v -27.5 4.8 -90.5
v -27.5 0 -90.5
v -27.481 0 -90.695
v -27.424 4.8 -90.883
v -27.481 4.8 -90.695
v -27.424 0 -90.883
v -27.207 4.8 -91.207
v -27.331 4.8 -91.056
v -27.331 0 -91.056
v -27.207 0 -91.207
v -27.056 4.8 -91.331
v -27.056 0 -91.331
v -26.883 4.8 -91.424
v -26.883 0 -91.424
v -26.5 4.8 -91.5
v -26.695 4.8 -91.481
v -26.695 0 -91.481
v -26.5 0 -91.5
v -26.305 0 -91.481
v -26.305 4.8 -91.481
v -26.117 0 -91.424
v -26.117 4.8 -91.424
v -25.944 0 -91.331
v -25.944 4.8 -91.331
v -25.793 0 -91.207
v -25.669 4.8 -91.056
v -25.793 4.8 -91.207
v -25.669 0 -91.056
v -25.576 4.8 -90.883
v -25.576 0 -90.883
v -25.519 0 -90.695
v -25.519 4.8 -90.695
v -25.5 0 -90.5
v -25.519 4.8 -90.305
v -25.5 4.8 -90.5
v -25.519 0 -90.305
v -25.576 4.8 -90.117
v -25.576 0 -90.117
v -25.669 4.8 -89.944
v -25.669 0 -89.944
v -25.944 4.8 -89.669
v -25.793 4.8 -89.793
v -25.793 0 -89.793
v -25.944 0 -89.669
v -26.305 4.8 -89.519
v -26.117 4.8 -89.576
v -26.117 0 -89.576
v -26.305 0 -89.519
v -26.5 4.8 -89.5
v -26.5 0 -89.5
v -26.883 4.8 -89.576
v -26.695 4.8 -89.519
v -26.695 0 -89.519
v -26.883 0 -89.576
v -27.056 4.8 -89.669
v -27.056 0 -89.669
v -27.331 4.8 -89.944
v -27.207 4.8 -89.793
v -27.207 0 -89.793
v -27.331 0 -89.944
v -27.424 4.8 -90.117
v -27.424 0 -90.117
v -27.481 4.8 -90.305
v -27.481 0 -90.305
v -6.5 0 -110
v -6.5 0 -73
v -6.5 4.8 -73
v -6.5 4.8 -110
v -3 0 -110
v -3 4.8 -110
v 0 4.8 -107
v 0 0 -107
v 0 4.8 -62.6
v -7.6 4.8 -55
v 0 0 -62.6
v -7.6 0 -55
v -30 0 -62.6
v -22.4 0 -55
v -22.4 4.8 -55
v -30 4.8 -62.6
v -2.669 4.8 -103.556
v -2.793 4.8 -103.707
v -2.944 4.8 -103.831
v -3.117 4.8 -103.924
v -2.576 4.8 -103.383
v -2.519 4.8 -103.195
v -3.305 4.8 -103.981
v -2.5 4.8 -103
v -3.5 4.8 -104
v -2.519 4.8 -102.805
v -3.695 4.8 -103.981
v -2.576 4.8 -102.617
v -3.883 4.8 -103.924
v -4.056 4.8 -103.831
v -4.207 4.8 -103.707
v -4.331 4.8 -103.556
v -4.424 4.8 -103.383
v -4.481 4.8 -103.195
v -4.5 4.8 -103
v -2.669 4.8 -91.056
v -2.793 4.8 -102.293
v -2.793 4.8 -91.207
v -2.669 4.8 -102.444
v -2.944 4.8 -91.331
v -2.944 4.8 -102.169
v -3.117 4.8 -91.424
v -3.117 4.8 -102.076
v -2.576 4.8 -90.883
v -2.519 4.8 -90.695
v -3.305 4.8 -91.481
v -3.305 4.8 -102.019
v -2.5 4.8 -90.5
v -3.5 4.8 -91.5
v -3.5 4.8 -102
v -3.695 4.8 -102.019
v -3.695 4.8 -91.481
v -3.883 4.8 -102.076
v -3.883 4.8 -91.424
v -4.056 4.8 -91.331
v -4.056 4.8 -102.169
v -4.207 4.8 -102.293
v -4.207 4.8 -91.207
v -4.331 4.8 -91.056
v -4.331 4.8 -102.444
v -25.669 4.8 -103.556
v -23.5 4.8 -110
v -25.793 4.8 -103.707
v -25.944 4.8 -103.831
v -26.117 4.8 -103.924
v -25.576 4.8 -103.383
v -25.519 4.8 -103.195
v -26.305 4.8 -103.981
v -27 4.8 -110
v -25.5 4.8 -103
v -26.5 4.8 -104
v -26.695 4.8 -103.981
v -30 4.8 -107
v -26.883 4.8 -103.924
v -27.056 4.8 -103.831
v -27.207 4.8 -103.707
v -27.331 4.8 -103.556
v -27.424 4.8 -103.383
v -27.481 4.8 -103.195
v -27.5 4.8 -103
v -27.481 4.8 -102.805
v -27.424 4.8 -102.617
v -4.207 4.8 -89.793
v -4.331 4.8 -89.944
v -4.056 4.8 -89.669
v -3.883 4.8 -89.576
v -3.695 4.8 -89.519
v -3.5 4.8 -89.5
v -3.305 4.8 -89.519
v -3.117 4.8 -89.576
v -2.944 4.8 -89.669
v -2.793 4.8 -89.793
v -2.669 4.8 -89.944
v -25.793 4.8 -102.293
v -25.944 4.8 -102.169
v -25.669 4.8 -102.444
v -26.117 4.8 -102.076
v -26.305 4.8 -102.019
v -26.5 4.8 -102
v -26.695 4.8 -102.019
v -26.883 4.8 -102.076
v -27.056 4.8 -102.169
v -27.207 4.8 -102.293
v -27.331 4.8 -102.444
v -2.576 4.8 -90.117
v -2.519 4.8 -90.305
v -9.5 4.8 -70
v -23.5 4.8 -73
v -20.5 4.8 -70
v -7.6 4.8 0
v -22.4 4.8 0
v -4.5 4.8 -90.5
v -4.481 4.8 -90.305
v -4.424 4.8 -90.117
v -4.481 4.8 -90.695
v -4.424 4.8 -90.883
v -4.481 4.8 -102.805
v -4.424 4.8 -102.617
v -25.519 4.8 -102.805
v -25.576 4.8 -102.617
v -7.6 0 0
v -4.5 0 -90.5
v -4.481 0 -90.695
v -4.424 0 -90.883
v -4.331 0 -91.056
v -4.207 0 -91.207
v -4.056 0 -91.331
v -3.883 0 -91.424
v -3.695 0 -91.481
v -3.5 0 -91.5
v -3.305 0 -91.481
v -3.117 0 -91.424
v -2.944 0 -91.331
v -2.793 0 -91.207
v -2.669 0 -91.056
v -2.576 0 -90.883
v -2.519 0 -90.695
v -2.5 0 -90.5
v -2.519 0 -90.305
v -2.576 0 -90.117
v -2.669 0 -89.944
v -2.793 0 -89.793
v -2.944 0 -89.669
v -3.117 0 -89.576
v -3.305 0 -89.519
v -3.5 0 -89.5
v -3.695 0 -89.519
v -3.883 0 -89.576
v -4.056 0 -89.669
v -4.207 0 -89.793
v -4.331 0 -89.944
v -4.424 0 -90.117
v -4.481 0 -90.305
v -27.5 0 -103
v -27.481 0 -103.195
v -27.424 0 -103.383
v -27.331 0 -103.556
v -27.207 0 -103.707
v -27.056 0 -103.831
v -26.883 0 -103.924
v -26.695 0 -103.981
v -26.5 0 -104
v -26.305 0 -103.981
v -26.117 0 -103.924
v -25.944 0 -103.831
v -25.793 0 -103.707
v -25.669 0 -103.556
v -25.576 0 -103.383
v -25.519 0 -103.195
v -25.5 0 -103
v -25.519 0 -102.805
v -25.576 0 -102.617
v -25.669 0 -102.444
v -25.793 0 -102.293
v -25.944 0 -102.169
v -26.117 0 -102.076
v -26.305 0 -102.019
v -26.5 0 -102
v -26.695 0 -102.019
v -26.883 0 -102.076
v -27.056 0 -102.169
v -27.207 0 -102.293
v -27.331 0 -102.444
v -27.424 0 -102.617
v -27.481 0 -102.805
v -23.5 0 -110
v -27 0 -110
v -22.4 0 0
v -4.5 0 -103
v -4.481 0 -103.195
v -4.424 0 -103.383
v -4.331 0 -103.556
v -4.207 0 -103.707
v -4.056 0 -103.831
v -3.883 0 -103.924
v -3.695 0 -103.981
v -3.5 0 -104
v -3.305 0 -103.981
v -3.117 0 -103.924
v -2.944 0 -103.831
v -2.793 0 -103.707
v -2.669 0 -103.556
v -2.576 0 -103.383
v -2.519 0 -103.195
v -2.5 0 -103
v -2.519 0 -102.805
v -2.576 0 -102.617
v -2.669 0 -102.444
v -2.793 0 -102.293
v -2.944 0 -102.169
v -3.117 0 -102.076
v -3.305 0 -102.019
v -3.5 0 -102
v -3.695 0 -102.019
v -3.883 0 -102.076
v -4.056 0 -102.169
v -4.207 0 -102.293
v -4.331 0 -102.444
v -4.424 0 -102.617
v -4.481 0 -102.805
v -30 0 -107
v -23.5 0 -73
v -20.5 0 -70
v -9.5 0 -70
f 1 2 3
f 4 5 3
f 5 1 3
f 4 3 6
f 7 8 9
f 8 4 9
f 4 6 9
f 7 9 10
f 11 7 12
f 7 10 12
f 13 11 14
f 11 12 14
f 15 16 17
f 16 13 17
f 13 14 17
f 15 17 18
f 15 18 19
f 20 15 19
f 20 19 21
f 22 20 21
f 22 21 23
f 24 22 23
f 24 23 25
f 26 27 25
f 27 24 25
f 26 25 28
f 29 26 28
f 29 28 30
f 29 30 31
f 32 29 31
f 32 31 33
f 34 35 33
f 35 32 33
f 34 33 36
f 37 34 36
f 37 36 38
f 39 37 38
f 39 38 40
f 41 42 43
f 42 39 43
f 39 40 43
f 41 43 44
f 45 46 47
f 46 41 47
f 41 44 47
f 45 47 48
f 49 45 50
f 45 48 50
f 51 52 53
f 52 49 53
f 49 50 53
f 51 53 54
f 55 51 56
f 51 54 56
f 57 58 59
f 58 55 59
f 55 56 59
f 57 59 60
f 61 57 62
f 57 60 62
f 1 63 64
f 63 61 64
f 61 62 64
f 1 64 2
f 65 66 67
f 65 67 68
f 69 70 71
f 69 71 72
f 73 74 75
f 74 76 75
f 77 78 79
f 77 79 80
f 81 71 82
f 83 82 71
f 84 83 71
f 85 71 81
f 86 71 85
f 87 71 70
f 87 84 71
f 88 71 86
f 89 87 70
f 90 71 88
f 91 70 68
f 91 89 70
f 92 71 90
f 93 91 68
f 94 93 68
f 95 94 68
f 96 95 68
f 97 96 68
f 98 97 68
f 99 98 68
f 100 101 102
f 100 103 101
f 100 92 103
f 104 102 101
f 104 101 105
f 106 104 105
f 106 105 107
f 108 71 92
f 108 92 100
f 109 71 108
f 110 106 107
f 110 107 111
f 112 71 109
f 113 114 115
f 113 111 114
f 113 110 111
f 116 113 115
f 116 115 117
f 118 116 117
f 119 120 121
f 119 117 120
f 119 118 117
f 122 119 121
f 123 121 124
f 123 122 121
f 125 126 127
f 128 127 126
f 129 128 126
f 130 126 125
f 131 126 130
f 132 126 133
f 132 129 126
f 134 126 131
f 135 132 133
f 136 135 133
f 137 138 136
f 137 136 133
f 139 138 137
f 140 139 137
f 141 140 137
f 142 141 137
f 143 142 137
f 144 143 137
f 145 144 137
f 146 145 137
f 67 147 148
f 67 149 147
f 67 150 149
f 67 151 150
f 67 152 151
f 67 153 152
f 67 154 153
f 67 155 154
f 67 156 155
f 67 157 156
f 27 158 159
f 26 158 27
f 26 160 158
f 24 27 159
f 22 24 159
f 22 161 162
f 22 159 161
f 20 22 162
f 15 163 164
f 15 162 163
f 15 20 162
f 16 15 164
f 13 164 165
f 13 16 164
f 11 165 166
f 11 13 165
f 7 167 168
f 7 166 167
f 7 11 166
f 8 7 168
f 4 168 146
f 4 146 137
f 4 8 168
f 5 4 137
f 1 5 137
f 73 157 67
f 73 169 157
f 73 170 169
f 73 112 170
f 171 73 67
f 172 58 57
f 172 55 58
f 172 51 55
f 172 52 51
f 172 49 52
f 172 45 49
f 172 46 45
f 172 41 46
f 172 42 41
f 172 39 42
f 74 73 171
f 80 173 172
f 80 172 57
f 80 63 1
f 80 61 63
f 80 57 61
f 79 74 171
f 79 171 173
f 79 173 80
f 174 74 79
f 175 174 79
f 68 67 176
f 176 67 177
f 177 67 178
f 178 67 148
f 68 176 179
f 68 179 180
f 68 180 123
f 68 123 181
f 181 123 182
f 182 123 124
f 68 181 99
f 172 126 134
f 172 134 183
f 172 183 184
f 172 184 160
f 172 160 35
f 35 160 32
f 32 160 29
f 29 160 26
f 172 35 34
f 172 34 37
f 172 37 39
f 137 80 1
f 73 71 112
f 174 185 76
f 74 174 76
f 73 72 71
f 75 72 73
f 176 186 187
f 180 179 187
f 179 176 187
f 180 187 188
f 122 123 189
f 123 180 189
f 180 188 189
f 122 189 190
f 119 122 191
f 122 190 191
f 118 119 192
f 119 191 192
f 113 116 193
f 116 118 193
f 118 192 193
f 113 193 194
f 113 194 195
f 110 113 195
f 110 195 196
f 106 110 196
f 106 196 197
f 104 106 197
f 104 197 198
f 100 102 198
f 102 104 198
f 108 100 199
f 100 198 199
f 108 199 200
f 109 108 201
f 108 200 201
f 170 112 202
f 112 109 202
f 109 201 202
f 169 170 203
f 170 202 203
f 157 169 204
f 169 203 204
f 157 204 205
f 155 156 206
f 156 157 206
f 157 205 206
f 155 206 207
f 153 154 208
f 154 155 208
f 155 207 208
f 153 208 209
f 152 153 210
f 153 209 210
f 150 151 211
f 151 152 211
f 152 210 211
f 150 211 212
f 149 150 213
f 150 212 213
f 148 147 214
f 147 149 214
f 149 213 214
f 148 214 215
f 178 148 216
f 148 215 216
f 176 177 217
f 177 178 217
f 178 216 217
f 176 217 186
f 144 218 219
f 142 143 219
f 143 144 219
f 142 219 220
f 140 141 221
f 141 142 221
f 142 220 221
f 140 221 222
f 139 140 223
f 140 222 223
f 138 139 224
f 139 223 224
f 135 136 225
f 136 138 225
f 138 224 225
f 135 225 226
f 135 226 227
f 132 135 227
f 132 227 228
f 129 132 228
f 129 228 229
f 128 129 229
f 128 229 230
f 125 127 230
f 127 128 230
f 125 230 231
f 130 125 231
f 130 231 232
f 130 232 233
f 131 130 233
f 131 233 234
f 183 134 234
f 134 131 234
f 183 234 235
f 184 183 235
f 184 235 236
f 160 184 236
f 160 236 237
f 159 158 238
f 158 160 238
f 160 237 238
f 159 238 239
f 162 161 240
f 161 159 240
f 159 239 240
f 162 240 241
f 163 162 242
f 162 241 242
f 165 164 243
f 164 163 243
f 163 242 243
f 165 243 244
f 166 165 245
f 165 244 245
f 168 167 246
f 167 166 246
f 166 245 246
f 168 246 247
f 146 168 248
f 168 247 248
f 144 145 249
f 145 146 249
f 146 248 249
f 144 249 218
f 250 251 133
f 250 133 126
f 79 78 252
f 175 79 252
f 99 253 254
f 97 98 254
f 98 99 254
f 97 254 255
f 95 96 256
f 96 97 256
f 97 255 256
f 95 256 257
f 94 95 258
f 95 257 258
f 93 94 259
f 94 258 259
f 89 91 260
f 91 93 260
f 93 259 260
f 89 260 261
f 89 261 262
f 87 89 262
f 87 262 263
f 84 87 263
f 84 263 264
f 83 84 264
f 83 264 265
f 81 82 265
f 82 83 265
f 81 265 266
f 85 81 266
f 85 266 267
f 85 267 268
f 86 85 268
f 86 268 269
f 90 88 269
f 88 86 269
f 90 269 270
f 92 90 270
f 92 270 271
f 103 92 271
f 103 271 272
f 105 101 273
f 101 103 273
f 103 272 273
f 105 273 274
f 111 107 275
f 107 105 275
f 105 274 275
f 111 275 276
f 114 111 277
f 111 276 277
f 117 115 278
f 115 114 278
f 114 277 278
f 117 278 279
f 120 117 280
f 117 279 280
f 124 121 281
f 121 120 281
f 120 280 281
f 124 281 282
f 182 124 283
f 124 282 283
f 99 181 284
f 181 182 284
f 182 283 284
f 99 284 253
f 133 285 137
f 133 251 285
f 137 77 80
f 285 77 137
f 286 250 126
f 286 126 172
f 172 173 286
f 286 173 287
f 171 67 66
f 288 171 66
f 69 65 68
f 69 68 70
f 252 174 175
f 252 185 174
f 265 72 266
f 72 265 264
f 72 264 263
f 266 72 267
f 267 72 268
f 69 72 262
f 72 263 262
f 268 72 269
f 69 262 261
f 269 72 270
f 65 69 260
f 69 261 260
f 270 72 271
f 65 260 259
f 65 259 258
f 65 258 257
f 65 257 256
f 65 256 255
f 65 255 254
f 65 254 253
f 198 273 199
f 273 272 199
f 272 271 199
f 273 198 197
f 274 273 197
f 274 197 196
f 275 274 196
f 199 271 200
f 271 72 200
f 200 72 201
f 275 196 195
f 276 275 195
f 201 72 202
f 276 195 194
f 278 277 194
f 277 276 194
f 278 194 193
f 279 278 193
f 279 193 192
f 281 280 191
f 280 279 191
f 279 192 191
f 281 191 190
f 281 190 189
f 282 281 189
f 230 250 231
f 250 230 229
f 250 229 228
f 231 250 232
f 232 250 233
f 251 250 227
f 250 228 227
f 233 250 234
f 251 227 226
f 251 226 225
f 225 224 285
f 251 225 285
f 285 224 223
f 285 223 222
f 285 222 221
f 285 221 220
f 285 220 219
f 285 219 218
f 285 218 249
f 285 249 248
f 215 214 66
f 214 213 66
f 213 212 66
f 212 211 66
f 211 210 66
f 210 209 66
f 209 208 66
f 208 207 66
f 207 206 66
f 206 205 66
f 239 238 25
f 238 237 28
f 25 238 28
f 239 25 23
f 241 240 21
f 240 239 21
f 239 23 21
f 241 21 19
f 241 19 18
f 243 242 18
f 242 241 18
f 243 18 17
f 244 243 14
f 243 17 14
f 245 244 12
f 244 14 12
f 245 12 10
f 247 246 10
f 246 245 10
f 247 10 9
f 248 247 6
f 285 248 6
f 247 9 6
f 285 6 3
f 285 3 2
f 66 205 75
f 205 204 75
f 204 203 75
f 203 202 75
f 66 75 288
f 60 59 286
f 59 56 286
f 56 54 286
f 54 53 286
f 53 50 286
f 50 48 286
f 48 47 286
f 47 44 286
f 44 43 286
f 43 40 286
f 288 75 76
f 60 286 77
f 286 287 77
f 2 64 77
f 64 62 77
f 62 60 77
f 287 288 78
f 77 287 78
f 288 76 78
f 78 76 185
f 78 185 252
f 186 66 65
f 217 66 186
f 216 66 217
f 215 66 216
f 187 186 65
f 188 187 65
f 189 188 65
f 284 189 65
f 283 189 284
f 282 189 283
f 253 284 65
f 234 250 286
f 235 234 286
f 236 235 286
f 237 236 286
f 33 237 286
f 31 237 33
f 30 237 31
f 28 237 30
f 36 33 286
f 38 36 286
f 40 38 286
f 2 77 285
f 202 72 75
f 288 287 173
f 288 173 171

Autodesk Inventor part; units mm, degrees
ref_plane "YZ Plane" through (0, 0, 0) normal (1, 0, 0) x (0, 1, 0)
ref_plane "XZ Plane" through (0, 0, 0) normal (0, 1, 0) x (-1, 0, 0)
ref_plane "XY Plane" through (0, 0, 0) normal (0, 0, 1) x (1, 0, 0)
sketch "Sketch1" plane through (0, 0, 0) normal (0, 1, 0) x (-1, 0, 0)
  line L0 (0, 0) -> (30, 0)
  line L1 (30, 0) -> (30, -110)
  line L2 (30, -110) -> (0, -110)
  line L3 (0, -110) -> (0, 0)
  line L4 (6.5, -110) -> (23.5, -110)
  line L5 (23.5, -110) -> (23.5, -70)
  line L6 (23.5, -70) -> (6.5, -70)
  line L7 (6.5, -70) -> (6.5, -110)
  circle A0 centre (26.5, -103) radius 1
  circle A1 centre (3.5, -103) radius 1
  line L8 (30, -105) -> (0, -105) construction
  circle A2 centre (26.5, -90.5) radius 1
  circle A3 centre (3.5, -90.5) radius 1
  line L9 (22.4, 0) -> (7.6, 0)
  line L10 (7.6, 0) -> (7.6, -55)
  line L11 (7.6, -55) -> (22.4, -55)
  line L12 (22.4, -55) -> (22.4, 0)
  line L13 (22.4, -55) -> (30, -62.6)
  line L14 (22.4, -55) -> (33.148, -55) construction
  line L15 (7.6, -55) -> (0, -62.6)
  line L16 (7.6, -55) -> (18.348, -55) construction
  point P0 (27.5, -90.5)
  point P1 (2.5, -90.5)
  point P2 (15, 0)
  point P3 (15, -55)
  point P4 (15, -70)
  point P5 (22.4, 0)
  point P6 (7.6, 0)
  dimension "d0" = 30
  dimension "d1" = 110
  dimension "d2" = 2
  dimension "d3" = 2
  dimension "d4" = 14.5
  dimension "d5" = 5
  dimension "d6" = 25
  dimension "d7" = 3
  dimension "d8" = 3
  dimension "d11" = 3.5
  dimension "d12" = 3.5
  dimension "d13" = 40
  dimension "d19" = 14.8
  dimension "d20" = 55
  dimension "d21" = 45
  dimension "d22" = 135
extrude "Extrusion1" add sketch "Sketch1" along normal blind 4.8 contours L0 L12 L11 L10 | L15 L11 L13 L1 L2 L5 L6 L7 L3
chamfer "Chamfer1" distance 3 angle 45 4 edges at (-23.5, 2.4, -70) (-6.5, 2.4, -70) (-30, 2.4, -110) (0, 2.4, -110)
properties part number "camera_holder"
